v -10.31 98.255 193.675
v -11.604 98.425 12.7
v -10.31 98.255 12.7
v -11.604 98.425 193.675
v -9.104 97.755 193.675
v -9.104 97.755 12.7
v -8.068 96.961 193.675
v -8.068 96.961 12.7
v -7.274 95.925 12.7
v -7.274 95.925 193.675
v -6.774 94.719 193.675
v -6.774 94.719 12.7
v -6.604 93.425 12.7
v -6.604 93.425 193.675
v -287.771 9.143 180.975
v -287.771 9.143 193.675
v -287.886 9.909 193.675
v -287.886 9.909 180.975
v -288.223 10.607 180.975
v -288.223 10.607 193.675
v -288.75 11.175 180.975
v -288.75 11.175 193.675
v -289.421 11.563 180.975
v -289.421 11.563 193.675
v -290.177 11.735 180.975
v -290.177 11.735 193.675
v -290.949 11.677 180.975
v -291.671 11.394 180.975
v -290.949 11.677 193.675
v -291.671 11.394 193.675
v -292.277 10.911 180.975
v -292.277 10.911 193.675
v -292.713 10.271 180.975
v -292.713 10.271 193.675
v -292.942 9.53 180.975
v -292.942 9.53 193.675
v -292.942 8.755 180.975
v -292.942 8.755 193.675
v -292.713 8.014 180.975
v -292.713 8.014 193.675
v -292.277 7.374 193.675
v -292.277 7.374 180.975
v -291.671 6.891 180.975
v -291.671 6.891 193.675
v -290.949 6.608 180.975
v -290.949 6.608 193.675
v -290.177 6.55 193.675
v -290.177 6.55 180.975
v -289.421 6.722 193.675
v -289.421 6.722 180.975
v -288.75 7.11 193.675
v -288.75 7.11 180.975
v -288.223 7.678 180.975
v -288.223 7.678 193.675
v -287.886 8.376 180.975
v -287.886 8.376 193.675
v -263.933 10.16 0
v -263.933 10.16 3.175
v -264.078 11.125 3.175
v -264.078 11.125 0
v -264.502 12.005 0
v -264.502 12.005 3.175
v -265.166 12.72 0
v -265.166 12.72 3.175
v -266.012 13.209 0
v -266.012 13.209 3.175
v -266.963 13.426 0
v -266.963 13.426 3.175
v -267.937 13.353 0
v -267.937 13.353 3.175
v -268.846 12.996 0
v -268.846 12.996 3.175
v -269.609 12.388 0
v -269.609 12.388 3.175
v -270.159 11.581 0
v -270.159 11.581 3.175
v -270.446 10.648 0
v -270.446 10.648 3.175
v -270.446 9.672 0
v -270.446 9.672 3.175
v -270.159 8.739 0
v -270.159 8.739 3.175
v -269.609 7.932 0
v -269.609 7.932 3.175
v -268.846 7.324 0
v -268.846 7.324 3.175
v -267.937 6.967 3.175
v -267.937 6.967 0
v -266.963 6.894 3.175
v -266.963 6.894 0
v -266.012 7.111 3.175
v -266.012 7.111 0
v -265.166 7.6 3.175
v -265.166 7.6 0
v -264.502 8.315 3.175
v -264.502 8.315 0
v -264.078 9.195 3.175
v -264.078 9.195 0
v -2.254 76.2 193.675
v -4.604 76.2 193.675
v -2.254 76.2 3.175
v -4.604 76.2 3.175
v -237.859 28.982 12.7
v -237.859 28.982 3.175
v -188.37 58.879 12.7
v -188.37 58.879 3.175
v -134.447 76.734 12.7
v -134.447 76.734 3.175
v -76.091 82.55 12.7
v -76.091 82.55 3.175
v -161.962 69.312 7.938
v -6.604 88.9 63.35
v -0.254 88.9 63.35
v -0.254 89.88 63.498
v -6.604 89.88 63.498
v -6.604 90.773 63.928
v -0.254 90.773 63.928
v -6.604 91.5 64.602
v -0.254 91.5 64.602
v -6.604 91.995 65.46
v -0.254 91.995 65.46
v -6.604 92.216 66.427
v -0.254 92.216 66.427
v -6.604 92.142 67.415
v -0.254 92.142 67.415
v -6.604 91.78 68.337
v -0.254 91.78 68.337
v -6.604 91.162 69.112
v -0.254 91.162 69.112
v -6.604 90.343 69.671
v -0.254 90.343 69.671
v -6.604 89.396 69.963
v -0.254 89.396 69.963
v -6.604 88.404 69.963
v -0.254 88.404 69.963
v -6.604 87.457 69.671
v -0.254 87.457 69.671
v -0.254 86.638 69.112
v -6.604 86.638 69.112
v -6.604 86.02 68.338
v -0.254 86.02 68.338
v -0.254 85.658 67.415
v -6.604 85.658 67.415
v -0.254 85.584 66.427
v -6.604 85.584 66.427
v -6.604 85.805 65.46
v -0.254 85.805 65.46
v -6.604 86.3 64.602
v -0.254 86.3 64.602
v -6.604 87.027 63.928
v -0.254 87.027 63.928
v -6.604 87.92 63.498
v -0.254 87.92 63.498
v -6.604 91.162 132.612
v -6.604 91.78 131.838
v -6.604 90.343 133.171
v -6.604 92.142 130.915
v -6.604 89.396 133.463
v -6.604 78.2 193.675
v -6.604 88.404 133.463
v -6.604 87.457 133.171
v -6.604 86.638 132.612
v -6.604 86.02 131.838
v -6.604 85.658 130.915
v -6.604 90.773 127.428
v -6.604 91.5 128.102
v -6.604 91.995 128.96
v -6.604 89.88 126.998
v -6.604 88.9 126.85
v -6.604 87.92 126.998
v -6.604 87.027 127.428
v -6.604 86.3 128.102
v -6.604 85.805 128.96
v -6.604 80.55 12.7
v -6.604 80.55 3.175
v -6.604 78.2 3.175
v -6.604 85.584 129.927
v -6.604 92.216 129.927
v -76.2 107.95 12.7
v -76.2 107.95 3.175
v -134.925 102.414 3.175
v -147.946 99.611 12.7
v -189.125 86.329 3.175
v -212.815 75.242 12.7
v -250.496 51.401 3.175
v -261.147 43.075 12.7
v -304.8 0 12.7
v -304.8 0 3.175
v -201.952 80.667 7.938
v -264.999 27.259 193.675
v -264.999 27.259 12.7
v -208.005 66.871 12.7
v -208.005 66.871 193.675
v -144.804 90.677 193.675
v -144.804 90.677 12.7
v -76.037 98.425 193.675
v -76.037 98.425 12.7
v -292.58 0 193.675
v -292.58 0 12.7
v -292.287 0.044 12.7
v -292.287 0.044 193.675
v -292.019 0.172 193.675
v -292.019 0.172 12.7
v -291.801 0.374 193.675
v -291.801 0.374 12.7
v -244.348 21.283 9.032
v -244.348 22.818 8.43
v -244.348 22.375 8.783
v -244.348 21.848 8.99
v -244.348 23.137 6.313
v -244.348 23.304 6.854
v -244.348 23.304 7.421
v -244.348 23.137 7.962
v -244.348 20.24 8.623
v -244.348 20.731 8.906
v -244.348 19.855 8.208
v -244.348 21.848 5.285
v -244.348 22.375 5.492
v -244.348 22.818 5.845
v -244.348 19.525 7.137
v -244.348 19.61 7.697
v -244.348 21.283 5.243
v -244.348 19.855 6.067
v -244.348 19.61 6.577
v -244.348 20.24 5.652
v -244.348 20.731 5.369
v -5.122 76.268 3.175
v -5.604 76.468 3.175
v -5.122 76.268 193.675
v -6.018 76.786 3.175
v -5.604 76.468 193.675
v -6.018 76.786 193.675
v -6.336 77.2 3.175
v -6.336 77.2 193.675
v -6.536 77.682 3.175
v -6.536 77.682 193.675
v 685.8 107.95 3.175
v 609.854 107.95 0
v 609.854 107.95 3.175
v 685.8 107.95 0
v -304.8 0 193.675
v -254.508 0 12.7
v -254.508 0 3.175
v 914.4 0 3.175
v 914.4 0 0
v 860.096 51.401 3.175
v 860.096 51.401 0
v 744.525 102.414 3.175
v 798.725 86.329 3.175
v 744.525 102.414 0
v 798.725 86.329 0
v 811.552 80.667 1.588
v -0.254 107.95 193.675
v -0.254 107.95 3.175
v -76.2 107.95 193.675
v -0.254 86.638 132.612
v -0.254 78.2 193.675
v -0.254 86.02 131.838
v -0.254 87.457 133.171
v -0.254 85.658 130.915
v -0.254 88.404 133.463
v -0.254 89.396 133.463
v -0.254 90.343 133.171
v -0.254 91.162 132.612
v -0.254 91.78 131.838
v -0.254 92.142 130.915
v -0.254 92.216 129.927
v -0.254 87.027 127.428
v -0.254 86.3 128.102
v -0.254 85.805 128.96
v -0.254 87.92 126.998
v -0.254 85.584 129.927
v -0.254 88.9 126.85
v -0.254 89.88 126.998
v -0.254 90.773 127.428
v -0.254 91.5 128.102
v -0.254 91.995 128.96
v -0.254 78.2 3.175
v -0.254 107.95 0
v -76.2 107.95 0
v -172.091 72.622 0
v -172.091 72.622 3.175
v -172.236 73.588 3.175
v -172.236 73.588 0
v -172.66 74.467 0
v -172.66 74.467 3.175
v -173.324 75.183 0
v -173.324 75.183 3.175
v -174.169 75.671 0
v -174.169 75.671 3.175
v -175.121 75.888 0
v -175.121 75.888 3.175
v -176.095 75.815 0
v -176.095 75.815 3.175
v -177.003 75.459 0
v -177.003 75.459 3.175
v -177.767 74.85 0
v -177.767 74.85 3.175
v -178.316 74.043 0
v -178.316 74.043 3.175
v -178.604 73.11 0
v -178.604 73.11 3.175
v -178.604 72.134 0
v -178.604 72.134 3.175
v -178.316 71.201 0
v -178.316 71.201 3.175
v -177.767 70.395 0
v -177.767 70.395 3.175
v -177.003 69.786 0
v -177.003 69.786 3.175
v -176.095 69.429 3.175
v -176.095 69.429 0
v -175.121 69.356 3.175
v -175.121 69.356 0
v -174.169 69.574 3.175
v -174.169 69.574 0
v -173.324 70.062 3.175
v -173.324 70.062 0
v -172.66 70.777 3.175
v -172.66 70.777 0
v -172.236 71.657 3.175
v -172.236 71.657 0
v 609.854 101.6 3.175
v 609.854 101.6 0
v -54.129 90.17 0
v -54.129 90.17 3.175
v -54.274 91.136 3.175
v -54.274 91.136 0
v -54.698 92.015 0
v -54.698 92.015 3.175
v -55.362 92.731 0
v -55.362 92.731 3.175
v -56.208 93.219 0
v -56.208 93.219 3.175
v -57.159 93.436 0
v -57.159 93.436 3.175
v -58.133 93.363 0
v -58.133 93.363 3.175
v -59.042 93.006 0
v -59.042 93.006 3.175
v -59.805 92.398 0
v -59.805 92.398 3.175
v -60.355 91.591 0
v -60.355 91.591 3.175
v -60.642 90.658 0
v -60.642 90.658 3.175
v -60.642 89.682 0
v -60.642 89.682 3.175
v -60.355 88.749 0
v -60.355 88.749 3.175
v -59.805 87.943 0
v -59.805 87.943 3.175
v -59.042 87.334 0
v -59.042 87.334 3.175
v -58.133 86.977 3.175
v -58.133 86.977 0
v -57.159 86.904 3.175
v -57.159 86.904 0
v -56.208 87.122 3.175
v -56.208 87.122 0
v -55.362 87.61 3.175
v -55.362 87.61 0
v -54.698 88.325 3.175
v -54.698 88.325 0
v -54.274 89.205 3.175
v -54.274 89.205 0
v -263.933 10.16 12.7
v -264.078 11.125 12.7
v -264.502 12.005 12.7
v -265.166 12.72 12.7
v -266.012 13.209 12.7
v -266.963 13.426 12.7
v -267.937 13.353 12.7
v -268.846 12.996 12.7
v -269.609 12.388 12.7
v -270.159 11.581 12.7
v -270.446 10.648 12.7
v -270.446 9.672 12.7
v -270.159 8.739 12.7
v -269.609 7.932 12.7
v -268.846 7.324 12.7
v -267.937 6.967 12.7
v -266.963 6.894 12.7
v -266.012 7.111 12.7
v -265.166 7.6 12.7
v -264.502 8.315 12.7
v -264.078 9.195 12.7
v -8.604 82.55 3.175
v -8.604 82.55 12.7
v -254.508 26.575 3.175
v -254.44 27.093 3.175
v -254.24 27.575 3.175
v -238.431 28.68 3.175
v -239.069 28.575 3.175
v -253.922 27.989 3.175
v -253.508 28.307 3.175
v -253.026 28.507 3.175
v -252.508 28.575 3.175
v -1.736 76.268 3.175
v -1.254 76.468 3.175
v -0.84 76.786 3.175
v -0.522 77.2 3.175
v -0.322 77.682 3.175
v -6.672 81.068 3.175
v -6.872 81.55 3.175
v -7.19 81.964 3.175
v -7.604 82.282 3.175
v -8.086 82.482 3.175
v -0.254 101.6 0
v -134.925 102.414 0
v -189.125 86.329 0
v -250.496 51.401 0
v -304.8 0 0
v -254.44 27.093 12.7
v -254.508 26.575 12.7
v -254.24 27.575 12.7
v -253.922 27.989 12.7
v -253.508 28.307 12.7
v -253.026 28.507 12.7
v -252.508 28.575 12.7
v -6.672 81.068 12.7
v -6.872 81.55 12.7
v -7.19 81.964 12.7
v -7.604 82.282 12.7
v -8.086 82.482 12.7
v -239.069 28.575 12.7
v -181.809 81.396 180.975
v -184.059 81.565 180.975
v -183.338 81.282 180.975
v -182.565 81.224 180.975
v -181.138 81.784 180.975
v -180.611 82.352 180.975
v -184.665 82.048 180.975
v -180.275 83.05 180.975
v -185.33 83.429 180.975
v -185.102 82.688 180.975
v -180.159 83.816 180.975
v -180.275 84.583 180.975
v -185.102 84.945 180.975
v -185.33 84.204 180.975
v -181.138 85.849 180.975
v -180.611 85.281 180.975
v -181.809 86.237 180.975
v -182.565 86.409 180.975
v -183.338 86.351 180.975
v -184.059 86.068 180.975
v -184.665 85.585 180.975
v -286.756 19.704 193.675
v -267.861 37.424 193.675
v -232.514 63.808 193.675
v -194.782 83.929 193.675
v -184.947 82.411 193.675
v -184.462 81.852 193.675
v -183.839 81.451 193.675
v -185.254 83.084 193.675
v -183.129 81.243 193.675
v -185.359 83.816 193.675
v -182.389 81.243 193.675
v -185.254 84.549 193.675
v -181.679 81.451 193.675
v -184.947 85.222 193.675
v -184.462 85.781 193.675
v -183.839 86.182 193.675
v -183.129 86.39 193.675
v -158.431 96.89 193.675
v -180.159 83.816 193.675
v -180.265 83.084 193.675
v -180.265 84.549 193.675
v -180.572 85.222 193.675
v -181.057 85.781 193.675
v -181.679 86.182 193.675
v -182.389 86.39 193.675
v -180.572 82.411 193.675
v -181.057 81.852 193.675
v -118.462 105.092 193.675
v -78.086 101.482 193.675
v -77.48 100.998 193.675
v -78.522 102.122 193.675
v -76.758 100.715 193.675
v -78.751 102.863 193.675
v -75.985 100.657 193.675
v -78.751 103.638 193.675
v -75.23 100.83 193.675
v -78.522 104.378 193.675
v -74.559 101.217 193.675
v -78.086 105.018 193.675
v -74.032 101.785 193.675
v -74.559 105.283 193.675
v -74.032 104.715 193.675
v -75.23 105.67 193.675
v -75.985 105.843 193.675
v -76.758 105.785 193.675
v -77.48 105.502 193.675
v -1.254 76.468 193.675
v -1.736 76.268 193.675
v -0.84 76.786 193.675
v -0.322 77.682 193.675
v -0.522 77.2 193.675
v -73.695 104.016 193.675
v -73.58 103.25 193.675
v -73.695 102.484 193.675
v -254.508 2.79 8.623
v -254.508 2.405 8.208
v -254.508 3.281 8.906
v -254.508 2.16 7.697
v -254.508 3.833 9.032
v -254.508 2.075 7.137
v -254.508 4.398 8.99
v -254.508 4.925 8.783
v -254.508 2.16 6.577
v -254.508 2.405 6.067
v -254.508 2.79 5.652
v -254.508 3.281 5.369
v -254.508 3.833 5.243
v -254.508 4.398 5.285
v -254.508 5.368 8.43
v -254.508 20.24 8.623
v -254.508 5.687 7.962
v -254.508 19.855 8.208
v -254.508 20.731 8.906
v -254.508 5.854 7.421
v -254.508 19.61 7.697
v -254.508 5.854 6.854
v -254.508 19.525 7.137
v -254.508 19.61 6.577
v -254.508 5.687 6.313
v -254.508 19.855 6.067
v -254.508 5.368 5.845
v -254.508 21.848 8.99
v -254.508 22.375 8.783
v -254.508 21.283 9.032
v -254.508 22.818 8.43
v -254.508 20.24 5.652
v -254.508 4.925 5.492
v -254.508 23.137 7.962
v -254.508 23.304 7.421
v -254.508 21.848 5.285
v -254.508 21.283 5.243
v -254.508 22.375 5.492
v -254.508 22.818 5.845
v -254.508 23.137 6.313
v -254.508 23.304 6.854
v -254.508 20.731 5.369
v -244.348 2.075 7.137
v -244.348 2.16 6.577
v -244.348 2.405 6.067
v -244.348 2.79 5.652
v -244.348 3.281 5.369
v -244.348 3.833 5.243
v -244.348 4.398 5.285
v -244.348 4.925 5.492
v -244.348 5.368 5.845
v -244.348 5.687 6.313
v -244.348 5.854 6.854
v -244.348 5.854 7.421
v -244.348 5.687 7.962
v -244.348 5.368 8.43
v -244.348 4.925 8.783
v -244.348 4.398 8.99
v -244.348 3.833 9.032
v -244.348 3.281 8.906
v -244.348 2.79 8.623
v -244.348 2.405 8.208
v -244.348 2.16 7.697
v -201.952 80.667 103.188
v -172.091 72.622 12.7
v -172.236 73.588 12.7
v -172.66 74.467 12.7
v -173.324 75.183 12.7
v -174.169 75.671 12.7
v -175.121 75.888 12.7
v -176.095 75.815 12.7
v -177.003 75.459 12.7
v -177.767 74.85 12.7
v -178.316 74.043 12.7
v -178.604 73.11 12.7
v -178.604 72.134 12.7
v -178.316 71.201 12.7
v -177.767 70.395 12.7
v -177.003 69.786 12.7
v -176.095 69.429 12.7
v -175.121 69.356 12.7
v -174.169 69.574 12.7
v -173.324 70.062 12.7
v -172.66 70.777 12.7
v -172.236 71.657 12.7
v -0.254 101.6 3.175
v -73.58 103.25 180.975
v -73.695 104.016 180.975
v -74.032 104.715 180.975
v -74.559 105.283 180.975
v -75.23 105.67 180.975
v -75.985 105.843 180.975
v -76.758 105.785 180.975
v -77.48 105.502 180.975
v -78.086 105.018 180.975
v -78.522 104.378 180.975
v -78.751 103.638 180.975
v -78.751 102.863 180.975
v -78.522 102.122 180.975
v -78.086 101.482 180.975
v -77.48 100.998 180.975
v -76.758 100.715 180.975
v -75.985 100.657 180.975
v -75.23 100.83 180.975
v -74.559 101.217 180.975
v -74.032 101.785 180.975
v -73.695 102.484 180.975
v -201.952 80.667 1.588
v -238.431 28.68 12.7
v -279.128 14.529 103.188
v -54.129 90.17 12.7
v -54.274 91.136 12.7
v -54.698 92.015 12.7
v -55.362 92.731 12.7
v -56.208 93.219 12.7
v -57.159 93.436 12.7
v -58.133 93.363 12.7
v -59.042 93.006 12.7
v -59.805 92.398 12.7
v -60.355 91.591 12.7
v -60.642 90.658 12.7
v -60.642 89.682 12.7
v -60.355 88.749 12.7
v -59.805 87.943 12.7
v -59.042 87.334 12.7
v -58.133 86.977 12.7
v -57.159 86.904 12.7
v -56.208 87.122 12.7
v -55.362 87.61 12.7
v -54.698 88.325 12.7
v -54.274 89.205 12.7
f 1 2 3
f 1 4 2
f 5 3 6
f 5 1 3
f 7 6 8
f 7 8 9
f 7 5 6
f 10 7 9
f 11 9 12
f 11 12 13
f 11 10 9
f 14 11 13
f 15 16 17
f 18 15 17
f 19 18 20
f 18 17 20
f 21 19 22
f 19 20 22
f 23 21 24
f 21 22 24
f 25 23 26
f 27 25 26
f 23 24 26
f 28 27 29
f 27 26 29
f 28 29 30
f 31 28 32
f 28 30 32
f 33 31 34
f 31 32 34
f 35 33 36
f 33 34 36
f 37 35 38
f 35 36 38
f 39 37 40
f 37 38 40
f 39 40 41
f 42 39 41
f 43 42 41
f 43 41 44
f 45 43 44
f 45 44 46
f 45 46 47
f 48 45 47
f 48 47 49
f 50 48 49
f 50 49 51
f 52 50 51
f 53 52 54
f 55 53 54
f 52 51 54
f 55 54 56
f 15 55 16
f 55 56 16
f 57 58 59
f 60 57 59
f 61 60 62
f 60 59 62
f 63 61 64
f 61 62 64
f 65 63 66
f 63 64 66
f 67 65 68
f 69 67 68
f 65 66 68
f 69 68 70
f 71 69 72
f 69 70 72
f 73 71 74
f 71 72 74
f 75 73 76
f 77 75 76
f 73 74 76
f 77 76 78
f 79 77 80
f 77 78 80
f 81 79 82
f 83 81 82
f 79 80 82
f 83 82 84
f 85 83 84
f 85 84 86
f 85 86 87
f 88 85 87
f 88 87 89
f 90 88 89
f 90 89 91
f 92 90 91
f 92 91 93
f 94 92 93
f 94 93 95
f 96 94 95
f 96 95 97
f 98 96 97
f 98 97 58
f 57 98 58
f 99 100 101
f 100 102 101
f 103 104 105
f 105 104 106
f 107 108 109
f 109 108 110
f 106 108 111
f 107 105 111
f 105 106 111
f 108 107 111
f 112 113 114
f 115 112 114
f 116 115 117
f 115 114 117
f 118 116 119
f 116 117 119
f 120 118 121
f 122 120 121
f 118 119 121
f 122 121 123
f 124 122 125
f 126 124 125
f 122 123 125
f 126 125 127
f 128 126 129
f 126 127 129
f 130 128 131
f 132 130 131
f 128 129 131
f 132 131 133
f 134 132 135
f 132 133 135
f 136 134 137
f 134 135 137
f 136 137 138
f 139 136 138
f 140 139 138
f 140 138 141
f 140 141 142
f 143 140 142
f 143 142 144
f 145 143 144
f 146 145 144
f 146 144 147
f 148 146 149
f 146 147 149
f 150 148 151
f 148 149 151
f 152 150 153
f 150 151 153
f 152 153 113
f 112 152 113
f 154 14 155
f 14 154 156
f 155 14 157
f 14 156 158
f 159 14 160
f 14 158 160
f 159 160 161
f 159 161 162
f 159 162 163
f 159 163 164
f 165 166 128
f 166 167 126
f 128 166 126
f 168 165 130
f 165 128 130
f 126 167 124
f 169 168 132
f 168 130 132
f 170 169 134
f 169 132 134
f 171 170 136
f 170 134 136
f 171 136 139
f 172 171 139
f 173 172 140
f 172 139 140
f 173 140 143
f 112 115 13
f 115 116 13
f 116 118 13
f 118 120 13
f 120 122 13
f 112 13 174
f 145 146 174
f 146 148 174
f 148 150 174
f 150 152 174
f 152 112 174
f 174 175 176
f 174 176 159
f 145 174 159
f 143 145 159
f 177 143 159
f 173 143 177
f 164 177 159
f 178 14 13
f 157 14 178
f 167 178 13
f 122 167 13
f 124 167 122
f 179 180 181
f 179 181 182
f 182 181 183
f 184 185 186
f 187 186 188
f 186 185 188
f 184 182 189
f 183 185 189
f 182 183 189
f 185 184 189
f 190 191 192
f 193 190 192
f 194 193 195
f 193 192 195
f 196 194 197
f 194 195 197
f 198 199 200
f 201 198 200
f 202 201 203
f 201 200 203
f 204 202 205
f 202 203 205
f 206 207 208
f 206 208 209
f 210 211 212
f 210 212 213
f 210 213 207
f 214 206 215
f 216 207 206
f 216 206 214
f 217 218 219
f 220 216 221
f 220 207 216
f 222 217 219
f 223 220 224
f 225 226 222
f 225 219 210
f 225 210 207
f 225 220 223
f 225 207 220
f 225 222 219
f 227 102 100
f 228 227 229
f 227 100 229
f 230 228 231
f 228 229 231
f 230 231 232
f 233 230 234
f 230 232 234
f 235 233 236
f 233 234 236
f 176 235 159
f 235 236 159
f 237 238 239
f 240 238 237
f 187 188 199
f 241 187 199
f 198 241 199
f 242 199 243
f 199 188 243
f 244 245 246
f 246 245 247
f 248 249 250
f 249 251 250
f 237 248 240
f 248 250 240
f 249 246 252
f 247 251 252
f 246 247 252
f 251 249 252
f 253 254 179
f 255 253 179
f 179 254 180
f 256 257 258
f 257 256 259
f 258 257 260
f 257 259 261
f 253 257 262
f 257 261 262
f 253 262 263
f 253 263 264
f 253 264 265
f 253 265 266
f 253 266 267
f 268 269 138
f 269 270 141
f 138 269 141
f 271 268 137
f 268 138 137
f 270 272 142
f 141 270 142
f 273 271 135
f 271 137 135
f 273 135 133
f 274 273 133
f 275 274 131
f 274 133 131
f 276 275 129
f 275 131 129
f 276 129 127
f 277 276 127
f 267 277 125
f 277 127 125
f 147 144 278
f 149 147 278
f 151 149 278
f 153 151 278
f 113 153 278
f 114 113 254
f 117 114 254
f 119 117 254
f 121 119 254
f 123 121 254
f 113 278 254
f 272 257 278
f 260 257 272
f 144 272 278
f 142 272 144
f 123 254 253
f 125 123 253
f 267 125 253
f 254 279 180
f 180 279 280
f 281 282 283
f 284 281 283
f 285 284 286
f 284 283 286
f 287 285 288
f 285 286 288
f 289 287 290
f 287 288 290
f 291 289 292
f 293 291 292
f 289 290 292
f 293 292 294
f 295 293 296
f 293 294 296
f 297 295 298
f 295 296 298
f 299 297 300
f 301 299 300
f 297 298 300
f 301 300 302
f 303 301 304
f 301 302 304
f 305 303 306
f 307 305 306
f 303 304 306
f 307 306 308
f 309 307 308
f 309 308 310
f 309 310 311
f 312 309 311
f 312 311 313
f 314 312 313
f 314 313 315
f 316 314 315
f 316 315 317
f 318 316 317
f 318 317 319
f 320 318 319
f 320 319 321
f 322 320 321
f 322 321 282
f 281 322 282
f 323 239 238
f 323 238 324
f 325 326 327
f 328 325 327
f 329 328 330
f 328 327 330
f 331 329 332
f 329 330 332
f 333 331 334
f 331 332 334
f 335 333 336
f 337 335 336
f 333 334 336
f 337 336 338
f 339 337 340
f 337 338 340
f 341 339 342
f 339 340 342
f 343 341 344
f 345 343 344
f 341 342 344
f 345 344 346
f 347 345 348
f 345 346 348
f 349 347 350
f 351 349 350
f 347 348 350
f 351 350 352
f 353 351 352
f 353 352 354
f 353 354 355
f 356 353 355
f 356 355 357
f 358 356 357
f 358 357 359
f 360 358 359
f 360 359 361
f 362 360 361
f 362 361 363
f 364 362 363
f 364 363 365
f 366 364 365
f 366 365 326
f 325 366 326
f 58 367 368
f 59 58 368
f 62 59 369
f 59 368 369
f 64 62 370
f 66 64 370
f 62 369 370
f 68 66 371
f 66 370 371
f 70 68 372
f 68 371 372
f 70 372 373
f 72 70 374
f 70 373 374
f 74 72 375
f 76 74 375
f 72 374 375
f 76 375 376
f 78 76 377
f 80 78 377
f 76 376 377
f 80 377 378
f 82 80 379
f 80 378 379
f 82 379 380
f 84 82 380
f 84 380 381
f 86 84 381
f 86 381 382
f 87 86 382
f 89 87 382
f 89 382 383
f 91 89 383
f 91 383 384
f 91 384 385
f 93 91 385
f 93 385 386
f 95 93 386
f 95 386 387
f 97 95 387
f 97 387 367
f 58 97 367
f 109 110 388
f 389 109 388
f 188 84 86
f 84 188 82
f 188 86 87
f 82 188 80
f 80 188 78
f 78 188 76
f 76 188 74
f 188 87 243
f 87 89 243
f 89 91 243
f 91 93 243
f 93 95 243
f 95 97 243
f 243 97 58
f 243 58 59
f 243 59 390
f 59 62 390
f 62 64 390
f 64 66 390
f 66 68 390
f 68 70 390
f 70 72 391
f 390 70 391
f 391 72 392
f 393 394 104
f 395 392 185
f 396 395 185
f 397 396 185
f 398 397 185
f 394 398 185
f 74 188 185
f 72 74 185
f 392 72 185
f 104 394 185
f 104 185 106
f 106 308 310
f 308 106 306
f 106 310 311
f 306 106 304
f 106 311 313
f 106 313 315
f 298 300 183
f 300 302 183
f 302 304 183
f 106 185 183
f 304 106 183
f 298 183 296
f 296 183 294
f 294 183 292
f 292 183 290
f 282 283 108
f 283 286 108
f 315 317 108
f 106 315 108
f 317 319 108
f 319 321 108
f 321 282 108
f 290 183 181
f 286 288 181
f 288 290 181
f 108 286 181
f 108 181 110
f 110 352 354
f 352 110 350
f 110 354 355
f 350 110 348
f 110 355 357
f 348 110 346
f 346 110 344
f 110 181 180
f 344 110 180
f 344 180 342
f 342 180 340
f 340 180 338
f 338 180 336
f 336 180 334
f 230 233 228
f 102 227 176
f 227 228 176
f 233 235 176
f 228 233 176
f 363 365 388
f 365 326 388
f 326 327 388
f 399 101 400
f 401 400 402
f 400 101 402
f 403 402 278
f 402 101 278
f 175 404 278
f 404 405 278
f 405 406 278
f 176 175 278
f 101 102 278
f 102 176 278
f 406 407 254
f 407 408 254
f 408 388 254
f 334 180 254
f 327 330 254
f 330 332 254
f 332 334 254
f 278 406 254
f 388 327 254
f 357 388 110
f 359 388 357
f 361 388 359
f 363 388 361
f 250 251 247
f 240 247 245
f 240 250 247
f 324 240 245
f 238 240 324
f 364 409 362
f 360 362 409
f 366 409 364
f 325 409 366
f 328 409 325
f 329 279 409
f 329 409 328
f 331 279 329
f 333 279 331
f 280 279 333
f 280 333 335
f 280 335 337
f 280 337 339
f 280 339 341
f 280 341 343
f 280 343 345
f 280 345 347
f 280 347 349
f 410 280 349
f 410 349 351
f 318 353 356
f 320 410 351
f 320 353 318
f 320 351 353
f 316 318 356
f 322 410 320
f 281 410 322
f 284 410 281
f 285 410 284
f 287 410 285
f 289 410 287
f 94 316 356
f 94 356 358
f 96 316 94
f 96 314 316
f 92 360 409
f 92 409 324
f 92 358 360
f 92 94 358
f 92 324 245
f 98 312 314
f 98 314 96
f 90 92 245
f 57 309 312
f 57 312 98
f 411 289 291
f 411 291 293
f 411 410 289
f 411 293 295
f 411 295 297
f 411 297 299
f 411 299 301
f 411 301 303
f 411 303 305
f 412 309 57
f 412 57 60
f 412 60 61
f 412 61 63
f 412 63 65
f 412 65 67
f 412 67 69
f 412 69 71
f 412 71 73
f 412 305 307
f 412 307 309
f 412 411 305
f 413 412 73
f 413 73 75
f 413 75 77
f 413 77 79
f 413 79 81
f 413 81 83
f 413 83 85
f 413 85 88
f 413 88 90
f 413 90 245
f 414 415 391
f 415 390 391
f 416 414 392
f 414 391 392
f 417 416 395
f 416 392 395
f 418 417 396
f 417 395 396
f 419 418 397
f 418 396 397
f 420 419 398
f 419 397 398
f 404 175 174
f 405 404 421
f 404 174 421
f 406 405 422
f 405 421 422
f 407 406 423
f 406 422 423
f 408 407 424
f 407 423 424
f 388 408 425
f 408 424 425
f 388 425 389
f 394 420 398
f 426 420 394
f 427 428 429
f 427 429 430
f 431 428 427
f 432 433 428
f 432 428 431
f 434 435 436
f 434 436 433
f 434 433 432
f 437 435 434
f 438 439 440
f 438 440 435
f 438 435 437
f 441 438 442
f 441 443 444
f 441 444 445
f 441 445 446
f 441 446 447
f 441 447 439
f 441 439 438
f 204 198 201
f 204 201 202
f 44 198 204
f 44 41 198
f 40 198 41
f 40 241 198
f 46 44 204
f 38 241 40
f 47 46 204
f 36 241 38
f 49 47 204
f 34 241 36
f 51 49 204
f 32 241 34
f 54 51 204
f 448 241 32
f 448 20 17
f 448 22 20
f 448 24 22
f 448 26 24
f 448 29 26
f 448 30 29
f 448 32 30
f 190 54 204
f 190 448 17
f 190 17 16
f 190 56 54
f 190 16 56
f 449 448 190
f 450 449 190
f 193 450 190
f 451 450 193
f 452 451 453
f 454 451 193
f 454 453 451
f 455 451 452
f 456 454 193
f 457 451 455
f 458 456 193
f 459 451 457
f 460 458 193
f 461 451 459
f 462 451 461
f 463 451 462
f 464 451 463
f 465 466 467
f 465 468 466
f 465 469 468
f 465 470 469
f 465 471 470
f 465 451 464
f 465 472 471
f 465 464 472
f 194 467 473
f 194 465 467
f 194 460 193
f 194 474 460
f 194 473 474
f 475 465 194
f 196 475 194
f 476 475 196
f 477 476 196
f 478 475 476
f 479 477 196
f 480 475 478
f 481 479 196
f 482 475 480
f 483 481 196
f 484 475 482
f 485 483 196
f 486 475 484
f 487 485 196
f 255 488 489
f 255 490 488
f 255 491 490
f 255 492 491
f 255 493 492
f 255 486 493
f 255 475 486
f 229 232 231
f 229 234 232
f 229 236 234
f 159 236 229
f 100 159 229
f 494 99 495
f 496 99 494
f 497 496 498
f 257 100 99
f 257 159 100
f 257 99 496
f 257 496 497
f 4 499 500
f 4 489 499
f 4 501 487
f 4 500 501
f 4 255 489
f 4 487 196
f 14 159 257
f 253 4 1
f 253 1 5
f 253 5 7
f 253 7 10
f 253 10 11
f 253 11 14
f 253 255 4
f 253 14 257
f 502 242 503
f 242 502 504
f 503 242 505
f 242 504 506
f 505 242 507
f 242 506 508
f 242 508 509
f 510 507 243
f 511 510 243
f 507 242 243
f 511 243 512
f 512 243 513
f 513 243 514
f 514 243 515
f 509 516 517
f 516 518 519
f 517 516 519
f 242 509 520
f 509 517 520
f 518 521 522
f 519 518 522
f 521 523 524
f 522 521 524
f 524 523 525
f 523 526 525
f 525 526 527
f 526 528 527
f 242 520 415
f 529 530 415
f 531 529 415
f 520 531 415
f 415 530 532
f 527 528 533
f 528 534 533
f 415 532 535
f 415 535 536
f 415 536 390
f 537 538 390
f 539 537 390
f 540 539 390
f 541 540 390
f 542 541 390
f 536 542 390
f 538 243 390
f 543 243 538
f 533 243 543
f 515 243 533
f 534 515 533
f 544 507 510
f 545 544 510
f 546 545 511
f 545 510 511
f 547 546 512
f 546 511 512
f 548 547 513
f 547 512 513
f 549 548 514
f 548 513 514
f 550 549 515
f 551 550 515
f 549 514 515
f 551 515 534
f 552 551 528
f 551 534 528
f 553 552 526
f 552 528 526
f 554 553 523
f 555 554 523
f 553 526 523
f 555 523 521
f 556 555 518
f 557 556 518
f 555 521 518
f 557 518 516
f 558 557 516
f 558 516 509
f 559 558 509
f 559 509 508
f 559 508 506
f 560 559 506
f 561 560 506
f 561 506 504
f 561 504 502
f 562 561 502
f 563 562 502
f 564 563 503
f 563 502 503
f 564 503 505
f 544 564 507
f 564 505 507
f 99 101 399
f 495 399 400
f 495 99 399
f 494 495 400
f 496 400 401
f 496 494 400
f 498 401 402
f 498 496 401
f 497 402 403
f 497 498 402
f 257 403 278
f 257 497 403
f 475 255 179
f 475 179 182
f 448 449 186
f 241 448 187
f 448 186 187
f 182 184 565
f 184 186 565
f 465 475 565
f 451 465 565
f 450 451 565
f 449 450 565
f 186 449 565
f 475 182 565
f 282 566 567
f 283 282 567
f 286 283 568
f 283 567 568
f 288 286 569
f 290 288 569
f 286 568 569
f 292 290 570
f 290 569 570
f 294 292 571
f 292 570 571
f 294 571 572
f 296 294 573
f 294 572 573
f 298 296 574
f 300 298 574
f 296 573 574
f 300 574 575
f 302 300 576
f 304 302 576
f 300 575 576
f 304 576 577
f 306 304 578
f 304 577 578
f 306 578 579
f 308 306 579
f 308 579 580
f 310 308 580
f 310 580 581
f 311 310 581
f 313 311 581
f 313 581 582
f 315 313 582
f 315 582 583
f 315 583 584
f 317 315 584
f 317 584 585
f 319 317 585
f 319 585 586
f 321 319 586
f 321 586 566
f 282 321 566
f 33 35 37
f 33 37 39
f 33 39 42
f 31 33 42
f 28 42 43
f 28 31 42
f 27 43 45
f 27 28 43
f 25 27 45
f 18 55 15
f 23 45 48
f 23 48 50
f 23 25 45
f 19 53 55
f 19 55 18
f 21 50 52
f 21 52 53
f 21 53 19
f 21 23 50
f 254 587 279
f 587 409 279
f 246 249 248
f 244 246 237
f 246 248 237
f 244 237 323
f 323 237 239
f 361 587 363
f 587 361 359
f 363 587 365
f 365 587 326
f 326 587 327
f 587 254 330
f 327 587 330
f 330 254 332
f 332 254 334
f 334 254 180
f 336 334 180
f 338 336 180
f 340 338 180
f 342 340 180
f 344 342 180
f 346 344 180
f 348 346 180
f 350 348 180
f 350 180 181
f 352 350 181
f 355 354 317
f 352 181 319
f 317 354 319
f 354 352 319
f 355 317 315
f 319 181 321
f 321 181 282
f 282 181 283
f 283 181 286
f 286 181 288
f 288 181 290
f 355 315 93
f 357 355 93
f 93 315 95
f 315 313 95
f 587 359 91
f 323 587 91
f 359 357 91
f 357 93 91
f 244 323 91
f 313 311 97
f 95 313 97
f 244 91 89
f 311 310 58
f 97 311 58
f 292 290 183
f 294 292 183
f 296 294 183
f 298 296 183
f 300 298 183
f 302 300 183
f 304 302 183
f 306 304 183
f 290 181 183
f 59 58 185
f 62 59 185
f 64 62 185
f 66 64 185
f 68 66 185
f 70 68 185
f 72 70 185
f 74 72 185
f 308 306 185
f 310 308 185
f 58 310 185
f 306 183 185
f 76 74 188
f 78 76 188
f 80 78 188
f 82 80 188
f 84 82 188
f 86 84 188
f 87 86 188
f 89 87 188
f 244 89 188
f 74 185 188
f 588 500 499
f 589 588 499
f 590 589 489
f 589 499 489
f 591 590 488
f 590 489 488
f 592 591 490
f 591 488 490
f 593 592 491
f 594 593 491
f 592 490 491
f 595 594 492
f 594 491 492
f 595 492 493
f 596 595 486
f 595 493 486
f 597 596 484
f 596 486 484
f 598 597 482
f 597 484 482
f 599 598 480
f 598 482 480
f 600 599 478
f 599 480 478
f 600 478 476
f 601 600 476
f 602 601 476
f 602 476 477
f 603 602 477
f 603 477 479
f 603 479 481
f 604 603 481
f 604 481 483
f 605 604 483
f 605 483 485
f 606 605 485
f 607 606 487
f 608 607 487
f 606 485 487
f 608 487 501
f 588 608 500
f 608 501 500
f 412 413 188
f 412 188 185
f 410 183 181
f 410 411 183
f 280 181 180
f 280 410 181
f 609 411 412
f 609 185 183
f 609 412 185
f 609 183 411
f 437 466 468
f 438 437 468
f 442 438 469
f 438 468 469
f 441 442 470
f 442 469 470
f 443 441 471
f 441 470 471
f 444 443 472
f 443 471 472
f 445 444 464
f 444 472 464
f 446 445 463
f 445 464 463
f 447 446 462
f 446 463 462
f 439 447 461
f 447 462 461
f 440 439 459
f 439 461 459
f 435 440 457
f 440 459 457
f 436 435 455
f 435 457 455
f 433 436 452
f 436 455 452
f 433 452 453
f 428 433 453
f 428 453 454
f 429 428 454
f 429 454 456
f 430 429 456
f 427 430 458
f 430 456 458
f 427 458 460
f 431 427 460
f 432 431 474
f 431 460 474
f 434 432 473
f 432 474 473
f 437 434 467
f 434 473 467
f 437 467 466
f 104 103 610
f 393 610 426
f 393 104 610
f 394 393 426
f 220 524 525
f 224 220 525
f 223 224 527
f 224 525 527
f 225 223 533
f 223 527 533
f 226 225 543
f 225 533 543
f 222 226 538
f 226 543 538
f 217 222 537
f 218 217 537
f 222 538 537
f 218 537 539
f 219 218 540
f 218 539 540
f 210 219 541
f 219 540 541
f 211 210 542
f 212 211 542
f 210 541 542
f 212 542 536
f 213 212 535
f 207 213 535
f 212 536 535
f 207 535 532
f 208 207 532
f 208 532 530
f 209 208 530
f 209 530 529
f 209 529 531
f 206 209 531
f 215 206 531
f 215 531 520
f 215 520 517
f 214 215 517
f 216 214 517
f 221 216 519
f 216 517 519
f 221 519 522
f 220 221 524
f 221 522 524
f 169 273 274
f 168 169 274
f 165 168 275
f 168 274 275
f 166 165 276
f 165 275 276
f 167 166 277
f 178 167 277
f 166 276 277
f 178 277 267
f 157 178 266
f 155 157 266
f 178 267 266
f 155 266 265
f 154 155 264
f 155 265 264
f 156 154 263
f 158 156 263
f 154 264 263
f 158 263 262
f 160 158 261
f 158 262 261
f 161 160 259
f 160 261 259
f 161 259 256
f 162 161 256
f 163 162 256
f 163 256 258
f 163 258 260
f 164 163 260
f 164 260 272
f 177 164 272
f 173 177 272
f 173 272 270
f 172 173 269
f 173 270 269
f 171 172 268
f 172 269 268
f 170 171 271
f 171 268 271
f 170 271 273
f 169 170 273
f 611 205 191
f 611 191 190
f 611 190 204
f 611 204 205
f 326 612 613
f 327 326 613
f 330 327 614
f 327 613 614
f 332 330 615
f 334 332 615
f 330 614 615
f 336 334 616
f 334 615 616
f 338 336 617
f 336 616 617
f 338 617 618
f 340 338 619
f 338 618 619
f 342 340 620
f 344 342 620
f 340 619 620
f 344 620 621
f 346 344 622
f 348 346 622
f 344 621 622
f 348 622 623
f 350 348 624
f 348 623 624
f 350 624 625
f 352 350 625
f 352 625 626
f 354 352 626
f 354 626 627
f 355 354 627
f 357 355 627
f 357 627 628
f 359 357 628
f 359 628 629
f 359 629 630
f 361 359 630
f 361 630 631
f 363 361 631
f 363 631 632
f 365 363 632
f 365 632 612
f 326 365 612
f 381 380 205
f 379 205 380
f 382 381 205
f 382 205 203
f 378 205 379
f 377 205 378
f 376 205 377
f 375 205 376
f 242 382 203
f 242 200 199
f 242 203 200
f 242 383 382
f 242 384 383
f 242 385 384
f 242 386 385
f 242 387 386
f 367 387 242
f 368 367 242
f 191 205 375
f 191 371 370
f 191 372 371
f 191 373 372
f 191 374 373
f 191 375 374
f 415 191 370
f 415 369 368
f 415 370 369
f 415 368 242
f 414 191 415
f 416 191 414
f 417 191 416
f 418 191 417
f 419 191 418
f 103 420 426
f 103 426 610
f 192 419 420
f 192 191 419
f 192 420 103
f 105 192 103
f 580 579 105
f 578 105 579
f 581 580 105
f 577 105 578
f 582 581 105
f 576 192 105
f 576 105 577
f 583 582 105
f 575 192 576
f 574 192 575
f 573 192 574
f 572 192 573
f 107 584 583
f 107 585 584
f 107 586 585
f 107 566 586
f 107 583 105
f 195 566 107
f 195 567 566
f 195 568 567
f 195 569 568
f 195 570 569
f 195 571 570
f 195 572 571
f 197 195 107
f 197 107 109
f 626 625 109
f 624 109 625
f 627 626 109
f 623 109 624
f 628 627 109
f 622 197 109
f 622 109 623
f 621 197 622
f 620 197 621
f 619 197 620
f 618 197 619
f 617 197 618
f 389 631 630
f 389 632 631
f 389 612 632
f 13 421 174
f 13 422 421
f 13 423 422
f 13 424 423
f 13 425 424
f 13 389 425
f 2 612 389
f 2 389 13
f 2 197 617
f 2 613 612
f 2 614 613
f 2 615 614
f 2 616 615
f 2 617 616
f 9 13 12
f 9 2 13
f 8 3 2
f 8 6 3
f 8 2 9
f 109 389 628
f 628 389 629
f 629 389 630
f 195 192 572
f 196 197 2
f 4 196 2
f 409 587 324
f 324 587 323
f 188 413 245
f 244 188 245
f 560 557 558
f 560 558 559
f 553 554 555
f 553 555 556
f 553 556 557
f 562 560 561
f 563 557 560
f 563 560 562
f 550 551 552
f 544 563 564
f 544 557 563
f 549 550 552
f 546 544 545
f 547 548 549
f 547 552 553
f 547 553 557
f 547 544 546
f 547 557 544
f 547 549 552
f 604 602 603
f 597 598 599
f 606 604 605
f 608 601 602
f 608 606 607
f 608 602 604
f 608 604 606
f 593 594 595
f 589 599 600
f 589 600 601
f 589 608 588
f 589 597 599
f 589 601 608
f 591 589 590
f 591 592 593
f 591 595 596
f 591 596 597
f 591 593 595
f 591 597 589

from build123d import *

# Parameters (mm, degrees)
BOSS_EXTRUDE1_DEPTH = 3.175
CUT_EXTRUDE1_DEPTH  = 921.755474233
BOSS_EXTRUDE2_DEPTH = 9.525
BOSS_EXTRUDE3_DEPTH = 180.975
SKETCH6_W           = 28.082698006
SKETCH6_H           = 28.575
CUT_EXTRUDE2_DEPTH  = 9.525
SKETCH7_R           = 3.275
CUT_EXTRUDE3_DEPTH  = 939.366939617
SKETCH8_R           = 3.325
CUT_EXTRUDE5_DEPTH  = 6.35
SKETCH9_R           = 2.6
SKETCH9_R_2         = 2.600000001
CUT_EXTRUDE6_DEPTH  = 12.7
SKETCH11_R          = 1.9
BOSS_EXTRUDE5_DEPTH = 10.16
FILLET1_R           = 5
FILLET2_R           = 2
FILLET3_R           = 1
FILLET4_R           = 2


# Read off the part's stored shape, not the designer's step: Split1
with BuildPart() as part:
    # Sketch1 → Boss-Extrude1 (new body)
    with BuildSketch(Plane.XY):
        with BuildLine():
            Line((0, 0), (-304.8, 0))
            add(Edge.make_bspline(
                [(-304.8, 0), (-213.403997347, 107.359981337), (-76.2, 107.95)],
                knots=[0, 0, 0, 1, 1, 1], degree=2))
            Line((-76.2, 107.95), (0, 107.95))
            Line((0, 107.95), (609.6, 107.95))
            Line((609.6, 107.95), (685.8, 107.95))
            add(Edge.make_bspline(
                [(914.4, 0), (823.003997347, 107.359981337), (685.8, 107.95)],
                knots=[0, 0, 0, 1, 1, 1], degree=2))
            Line((914.4, 0), (609.6, 0))
            Line((609.6, 0), (0, 0))
        make_face()
    extrude(amount=BOSS_EXTRUDE1_DEPTH)

    # Sketch2 → Cut-Extrude1 (cut, through all)
    with BuildSketch(Plane.XY.offset(3.175)):
        Polygon((0, 107.95), (609.6, 107.95), (609.854, 107.95), (609.854, 101.6), (609.6, 101.6), (0, 101.6), (-0.254, 101.6), (-0.254, 107.95), align=None)
    extrude(amount=-CUT_EXTRUDE1_DEPTH, mode=Mode.SUBTRACT)

    # Sketch3 → Boss-Extrude2 (add)
    with BuildSketch(Plane.XY.offset(3.175)):
        with BuildLine():
            Line((-304.8, 0), (-254.508, 0))
            Line((-254.508, 0), (-254.508, 15.344828713))
            add(Edge.make_bspline(
                [(-254.508, 15.344828713), (-177.798332328, 82.893238953), (-76.090773332, 82.550234853)],
                knots=[0, 0, 0, 1, 1, 1], degree=2))
            Line((-76.090773332, 82.550234853), (-6.604, 82.550234853))
            Line((-6.604, 82.550234853), (-6.604, 76.2))
            Line((-6.604, 76.2), (-0.254, 76.2))
            Line((-0.254, 76.2), (-0.254, 107.95))
            Line((-0.254, 107.95), (-76.2, 107.95))
            add(Edge.make_bspline(
                [(-76.2, 107.95), (-213.403997347, 107.359981337), (-304.8, 0)],
                knots=[0, 0, 0, 1, 1, 1], degree=2))
        make_face()
    extrude(amount=BOSS_EXTRUDE2_DEPTH)

    # Sketch5 → Boss-Extrude3 (add)
    with BuildSketch(Plane.XY.offset(12.7)):
        with BuildLine():
            Line((-304.8, 0), (-292.1, 0))
            add(Edge.make_bspline(
                [(-264.999310143, 27.259023461), (-280.043189094, 15.090688978), (-292.1, 0)],
                knots=[0, 0, 0, 1, 1, 1], degree=2))
            add(Edge.make_bspline(
                [(-264.999310143, 27.259023461), (-263.324912471, 28.733451708), (-259.93755133, 31.654735884), (-253.107003874, 37.29977015), (-244.418964995, 44.024448353), (-233.76867915, 51.547177424), (-219.265929961, 60.847632169), (-200.578257731, 71.093058658), (-177.28374589, 81.152323376), (-153.155325898, 88.956116173), (-132.386582303, 93.571898544), (-115.39333326, 96.133277835), (-102.464741628, 97.490056952), (-91.537068573, 98.151901873), (-82.713415498, 98.401217113), (-78.259134389, 98.432637828), (-76.037235922, 98.425144577)],
                knots=[0.49783188, 0.49783188, 0.49783188, 0.49783188, 0.497964782, 0.498097684, 0.498363488, 0.498629292, 0.498895096, 0.499426703, 0.499958311, 0.500489919, 0.501021527, 0.501287331, 0.501553135, 0.501818938, 0.50195184, 0.502084742, 0.502084742, 0.502084742, 0.502084742], degree=3))
            Line((-76.037235922, 98.425144577), (-6.604, 98.425144577))
            Line((-6.604, 98.425144577), (-6.604, 82.550234853))
            Line((-6.604, 82.550234853), (-6.604, 76.2))
            Line((-6.604, 76.2), (-0.254, 76.2))
            Line((-0.254, 76.2), (-0.254, 107.95))
            Line((-0.254, 107.95), (-76.199999999, 107.95))
            add(Edge.make_bspline(
                [(-76.199999999, 107.95), (-213.403997347, 107.359981337), (-304.8, 0)],
                knots=[0, 0, 0, 1, 1, 1], degree=2))
        make_face()
    extrude(amount=BOSS_EXTRUDE3_DEPTH)

    # Sketch6 → Cut-Extrude2 (cut)
    with BuildSketch(Plane.XY.offset(12.7)):
        with Locations((-240.466650997, 14.2875)):
            Rectangle(SKETCH6_W, SKETCH6_H)
    extrude(amount=-CUT_EXTRUDE2_DEPTH, mode=Mode.SUBTRACT)

    # Sketch7 → Cut-Extrude3 (cut, through all)
    with BuildSketch(Plane.XY.offset(12.7)):
        with Locations((-267.208, 10.16)):
            Circle(SKETCH7_R)
        with Locations((-175.365808452, 72.622269579)):
            Circle(SKETCH7_R)
        with Locations((-57.404, 90.17019152)):
            Circle(SKETCH7_R)
    extrude(amount=-CUT_EXTRUDE3_DEPTH, mode=Mode.SUBTRACT)

    # Sketch8 → Cut-Extrude5 (cut)
    with BuildSketch(Plane(origin=(-0.254, 0, 0), x_dir=(0, 0, -1), z_dir=(1, 0, 0))):
        with Locations((-66.675, 88.9)):
            Circle(SKETCH8_R)
        with Locations((-130.175, 88.9)):
            Circle(SKETCH8_R)
    extrude(amount=-CUT_EXTRUDE5_DEPTH, mode=Mode.SUBTRACT)

    # Sketch9 → Cut-Extrude6 (cut)
    with BuildSketch(Plane.XY.offset(193.675)):
        with Locations((-290.370830702, 9.142552388)):
            Circle(SKETCH9_R)
        with Locations((-182.759356376, 83.816480509)):
            Circle(SKETCH9_R)
        with Locations((-76.179788765, 103.250043457)):
            Circle(SKETCH9_R_2)
    extrude(amount=-CUT_EXTRUDE6_DEPTH, mode=Mode.SUBTRACT)

    # Sketch11 → Boss-Extrude5 (add)
    with BuildSketch(Plane(origin=(-254.508, 2e-09, 0), x_dir=(0, 0, -1), z_dir=(1.0, -6.037741648177811e-12, 0))):
        with Locations(Location((-7.1374, 3.975099998, 0), (0, 0, 270))):
            Circle(SKETCH11_R)
        with Locations(Location((-7.1374, 21.425099998, 0), (0, 0, 270))):
            Circle(SKETCH11_R)
    extrude(amount=BOSS_EXTRUDE5_DEPTH)

    # Fillet1
    fillet1_edges = [part.edges().sort_by_distance(p)[0] for p in [
        (-6.604, 98.425144577, 103.1875),
    ]]
    fillet(fillet1_edges, radius=FILLET1_R)

    # Fillet2
    fillet2_edges = [part.edges().sort_by_distance(p)[0] for p in [
        (-238.394170448, 28.575, 7.9375),
        (-254.508, 28.575, 7.9375),
    ]]
    fillet(fillet2_edges, radius=FILLET2_R)

    # Fillet3
    # the kernel refuses this fillet: 1 mm, written as the material it takes off along each edge
    with BuildSketch(Plane(origin=(-292.1, 0, 12.7), x_dir=(0.6252400597778598, 0.7804324875663354, 0), z_dir=(0, 0, 1))) as fillet3_piece_1:
        with BuildLine():
            CenterArc((0.480195921, 0.999999109), FILLET3_R, 218.699809372, 51.223710378)
            Line((-0.300236566, 0.374759049), (-0.315845216, 0.362254248))
            Line((-0.315845216, 0.362254248), (-0.01560865, -0.012504801))
            Line((-0.01560865, -0.012504801), (2.669e-05, -0.019999982))
            ThreePointArc((2.669e-05, -0.019999982), (0.239430546, -0.019840221), (0.478834393, -0.019999982))
            Line((0.478834393, -0.019999982), (0.478861089, 0))
        make_face()
    extrude(amount=180.975, mode=Mode.SUBTRACT)

    # Fillet4
    fillet4_edges = [part.edges().sort_by_distance(p)[0] for p in [
        (-6.604, 82.550234853, 7.9375),
        (-6.604, 76.2, 98.425),
        (-0.254, 76.2, 98.425),
    ]]
    fillet(fillet4_edges, radius=FILLET4_R)


with BuildPart() as body_2:
    # Split1: the piece on the far side of the plane
    add(part.part)
    split(bisect_by=Plane.XY.offset(3.175), keep=Keep.BOTTOM)


with BuildPart() as part_1:
    add(part.part)

    # Split1
    split(bisect_by=Plane.XY.offset(3.175), keep=Keep.TOP)


solid = Compound([body_2.part, part_1.part])
